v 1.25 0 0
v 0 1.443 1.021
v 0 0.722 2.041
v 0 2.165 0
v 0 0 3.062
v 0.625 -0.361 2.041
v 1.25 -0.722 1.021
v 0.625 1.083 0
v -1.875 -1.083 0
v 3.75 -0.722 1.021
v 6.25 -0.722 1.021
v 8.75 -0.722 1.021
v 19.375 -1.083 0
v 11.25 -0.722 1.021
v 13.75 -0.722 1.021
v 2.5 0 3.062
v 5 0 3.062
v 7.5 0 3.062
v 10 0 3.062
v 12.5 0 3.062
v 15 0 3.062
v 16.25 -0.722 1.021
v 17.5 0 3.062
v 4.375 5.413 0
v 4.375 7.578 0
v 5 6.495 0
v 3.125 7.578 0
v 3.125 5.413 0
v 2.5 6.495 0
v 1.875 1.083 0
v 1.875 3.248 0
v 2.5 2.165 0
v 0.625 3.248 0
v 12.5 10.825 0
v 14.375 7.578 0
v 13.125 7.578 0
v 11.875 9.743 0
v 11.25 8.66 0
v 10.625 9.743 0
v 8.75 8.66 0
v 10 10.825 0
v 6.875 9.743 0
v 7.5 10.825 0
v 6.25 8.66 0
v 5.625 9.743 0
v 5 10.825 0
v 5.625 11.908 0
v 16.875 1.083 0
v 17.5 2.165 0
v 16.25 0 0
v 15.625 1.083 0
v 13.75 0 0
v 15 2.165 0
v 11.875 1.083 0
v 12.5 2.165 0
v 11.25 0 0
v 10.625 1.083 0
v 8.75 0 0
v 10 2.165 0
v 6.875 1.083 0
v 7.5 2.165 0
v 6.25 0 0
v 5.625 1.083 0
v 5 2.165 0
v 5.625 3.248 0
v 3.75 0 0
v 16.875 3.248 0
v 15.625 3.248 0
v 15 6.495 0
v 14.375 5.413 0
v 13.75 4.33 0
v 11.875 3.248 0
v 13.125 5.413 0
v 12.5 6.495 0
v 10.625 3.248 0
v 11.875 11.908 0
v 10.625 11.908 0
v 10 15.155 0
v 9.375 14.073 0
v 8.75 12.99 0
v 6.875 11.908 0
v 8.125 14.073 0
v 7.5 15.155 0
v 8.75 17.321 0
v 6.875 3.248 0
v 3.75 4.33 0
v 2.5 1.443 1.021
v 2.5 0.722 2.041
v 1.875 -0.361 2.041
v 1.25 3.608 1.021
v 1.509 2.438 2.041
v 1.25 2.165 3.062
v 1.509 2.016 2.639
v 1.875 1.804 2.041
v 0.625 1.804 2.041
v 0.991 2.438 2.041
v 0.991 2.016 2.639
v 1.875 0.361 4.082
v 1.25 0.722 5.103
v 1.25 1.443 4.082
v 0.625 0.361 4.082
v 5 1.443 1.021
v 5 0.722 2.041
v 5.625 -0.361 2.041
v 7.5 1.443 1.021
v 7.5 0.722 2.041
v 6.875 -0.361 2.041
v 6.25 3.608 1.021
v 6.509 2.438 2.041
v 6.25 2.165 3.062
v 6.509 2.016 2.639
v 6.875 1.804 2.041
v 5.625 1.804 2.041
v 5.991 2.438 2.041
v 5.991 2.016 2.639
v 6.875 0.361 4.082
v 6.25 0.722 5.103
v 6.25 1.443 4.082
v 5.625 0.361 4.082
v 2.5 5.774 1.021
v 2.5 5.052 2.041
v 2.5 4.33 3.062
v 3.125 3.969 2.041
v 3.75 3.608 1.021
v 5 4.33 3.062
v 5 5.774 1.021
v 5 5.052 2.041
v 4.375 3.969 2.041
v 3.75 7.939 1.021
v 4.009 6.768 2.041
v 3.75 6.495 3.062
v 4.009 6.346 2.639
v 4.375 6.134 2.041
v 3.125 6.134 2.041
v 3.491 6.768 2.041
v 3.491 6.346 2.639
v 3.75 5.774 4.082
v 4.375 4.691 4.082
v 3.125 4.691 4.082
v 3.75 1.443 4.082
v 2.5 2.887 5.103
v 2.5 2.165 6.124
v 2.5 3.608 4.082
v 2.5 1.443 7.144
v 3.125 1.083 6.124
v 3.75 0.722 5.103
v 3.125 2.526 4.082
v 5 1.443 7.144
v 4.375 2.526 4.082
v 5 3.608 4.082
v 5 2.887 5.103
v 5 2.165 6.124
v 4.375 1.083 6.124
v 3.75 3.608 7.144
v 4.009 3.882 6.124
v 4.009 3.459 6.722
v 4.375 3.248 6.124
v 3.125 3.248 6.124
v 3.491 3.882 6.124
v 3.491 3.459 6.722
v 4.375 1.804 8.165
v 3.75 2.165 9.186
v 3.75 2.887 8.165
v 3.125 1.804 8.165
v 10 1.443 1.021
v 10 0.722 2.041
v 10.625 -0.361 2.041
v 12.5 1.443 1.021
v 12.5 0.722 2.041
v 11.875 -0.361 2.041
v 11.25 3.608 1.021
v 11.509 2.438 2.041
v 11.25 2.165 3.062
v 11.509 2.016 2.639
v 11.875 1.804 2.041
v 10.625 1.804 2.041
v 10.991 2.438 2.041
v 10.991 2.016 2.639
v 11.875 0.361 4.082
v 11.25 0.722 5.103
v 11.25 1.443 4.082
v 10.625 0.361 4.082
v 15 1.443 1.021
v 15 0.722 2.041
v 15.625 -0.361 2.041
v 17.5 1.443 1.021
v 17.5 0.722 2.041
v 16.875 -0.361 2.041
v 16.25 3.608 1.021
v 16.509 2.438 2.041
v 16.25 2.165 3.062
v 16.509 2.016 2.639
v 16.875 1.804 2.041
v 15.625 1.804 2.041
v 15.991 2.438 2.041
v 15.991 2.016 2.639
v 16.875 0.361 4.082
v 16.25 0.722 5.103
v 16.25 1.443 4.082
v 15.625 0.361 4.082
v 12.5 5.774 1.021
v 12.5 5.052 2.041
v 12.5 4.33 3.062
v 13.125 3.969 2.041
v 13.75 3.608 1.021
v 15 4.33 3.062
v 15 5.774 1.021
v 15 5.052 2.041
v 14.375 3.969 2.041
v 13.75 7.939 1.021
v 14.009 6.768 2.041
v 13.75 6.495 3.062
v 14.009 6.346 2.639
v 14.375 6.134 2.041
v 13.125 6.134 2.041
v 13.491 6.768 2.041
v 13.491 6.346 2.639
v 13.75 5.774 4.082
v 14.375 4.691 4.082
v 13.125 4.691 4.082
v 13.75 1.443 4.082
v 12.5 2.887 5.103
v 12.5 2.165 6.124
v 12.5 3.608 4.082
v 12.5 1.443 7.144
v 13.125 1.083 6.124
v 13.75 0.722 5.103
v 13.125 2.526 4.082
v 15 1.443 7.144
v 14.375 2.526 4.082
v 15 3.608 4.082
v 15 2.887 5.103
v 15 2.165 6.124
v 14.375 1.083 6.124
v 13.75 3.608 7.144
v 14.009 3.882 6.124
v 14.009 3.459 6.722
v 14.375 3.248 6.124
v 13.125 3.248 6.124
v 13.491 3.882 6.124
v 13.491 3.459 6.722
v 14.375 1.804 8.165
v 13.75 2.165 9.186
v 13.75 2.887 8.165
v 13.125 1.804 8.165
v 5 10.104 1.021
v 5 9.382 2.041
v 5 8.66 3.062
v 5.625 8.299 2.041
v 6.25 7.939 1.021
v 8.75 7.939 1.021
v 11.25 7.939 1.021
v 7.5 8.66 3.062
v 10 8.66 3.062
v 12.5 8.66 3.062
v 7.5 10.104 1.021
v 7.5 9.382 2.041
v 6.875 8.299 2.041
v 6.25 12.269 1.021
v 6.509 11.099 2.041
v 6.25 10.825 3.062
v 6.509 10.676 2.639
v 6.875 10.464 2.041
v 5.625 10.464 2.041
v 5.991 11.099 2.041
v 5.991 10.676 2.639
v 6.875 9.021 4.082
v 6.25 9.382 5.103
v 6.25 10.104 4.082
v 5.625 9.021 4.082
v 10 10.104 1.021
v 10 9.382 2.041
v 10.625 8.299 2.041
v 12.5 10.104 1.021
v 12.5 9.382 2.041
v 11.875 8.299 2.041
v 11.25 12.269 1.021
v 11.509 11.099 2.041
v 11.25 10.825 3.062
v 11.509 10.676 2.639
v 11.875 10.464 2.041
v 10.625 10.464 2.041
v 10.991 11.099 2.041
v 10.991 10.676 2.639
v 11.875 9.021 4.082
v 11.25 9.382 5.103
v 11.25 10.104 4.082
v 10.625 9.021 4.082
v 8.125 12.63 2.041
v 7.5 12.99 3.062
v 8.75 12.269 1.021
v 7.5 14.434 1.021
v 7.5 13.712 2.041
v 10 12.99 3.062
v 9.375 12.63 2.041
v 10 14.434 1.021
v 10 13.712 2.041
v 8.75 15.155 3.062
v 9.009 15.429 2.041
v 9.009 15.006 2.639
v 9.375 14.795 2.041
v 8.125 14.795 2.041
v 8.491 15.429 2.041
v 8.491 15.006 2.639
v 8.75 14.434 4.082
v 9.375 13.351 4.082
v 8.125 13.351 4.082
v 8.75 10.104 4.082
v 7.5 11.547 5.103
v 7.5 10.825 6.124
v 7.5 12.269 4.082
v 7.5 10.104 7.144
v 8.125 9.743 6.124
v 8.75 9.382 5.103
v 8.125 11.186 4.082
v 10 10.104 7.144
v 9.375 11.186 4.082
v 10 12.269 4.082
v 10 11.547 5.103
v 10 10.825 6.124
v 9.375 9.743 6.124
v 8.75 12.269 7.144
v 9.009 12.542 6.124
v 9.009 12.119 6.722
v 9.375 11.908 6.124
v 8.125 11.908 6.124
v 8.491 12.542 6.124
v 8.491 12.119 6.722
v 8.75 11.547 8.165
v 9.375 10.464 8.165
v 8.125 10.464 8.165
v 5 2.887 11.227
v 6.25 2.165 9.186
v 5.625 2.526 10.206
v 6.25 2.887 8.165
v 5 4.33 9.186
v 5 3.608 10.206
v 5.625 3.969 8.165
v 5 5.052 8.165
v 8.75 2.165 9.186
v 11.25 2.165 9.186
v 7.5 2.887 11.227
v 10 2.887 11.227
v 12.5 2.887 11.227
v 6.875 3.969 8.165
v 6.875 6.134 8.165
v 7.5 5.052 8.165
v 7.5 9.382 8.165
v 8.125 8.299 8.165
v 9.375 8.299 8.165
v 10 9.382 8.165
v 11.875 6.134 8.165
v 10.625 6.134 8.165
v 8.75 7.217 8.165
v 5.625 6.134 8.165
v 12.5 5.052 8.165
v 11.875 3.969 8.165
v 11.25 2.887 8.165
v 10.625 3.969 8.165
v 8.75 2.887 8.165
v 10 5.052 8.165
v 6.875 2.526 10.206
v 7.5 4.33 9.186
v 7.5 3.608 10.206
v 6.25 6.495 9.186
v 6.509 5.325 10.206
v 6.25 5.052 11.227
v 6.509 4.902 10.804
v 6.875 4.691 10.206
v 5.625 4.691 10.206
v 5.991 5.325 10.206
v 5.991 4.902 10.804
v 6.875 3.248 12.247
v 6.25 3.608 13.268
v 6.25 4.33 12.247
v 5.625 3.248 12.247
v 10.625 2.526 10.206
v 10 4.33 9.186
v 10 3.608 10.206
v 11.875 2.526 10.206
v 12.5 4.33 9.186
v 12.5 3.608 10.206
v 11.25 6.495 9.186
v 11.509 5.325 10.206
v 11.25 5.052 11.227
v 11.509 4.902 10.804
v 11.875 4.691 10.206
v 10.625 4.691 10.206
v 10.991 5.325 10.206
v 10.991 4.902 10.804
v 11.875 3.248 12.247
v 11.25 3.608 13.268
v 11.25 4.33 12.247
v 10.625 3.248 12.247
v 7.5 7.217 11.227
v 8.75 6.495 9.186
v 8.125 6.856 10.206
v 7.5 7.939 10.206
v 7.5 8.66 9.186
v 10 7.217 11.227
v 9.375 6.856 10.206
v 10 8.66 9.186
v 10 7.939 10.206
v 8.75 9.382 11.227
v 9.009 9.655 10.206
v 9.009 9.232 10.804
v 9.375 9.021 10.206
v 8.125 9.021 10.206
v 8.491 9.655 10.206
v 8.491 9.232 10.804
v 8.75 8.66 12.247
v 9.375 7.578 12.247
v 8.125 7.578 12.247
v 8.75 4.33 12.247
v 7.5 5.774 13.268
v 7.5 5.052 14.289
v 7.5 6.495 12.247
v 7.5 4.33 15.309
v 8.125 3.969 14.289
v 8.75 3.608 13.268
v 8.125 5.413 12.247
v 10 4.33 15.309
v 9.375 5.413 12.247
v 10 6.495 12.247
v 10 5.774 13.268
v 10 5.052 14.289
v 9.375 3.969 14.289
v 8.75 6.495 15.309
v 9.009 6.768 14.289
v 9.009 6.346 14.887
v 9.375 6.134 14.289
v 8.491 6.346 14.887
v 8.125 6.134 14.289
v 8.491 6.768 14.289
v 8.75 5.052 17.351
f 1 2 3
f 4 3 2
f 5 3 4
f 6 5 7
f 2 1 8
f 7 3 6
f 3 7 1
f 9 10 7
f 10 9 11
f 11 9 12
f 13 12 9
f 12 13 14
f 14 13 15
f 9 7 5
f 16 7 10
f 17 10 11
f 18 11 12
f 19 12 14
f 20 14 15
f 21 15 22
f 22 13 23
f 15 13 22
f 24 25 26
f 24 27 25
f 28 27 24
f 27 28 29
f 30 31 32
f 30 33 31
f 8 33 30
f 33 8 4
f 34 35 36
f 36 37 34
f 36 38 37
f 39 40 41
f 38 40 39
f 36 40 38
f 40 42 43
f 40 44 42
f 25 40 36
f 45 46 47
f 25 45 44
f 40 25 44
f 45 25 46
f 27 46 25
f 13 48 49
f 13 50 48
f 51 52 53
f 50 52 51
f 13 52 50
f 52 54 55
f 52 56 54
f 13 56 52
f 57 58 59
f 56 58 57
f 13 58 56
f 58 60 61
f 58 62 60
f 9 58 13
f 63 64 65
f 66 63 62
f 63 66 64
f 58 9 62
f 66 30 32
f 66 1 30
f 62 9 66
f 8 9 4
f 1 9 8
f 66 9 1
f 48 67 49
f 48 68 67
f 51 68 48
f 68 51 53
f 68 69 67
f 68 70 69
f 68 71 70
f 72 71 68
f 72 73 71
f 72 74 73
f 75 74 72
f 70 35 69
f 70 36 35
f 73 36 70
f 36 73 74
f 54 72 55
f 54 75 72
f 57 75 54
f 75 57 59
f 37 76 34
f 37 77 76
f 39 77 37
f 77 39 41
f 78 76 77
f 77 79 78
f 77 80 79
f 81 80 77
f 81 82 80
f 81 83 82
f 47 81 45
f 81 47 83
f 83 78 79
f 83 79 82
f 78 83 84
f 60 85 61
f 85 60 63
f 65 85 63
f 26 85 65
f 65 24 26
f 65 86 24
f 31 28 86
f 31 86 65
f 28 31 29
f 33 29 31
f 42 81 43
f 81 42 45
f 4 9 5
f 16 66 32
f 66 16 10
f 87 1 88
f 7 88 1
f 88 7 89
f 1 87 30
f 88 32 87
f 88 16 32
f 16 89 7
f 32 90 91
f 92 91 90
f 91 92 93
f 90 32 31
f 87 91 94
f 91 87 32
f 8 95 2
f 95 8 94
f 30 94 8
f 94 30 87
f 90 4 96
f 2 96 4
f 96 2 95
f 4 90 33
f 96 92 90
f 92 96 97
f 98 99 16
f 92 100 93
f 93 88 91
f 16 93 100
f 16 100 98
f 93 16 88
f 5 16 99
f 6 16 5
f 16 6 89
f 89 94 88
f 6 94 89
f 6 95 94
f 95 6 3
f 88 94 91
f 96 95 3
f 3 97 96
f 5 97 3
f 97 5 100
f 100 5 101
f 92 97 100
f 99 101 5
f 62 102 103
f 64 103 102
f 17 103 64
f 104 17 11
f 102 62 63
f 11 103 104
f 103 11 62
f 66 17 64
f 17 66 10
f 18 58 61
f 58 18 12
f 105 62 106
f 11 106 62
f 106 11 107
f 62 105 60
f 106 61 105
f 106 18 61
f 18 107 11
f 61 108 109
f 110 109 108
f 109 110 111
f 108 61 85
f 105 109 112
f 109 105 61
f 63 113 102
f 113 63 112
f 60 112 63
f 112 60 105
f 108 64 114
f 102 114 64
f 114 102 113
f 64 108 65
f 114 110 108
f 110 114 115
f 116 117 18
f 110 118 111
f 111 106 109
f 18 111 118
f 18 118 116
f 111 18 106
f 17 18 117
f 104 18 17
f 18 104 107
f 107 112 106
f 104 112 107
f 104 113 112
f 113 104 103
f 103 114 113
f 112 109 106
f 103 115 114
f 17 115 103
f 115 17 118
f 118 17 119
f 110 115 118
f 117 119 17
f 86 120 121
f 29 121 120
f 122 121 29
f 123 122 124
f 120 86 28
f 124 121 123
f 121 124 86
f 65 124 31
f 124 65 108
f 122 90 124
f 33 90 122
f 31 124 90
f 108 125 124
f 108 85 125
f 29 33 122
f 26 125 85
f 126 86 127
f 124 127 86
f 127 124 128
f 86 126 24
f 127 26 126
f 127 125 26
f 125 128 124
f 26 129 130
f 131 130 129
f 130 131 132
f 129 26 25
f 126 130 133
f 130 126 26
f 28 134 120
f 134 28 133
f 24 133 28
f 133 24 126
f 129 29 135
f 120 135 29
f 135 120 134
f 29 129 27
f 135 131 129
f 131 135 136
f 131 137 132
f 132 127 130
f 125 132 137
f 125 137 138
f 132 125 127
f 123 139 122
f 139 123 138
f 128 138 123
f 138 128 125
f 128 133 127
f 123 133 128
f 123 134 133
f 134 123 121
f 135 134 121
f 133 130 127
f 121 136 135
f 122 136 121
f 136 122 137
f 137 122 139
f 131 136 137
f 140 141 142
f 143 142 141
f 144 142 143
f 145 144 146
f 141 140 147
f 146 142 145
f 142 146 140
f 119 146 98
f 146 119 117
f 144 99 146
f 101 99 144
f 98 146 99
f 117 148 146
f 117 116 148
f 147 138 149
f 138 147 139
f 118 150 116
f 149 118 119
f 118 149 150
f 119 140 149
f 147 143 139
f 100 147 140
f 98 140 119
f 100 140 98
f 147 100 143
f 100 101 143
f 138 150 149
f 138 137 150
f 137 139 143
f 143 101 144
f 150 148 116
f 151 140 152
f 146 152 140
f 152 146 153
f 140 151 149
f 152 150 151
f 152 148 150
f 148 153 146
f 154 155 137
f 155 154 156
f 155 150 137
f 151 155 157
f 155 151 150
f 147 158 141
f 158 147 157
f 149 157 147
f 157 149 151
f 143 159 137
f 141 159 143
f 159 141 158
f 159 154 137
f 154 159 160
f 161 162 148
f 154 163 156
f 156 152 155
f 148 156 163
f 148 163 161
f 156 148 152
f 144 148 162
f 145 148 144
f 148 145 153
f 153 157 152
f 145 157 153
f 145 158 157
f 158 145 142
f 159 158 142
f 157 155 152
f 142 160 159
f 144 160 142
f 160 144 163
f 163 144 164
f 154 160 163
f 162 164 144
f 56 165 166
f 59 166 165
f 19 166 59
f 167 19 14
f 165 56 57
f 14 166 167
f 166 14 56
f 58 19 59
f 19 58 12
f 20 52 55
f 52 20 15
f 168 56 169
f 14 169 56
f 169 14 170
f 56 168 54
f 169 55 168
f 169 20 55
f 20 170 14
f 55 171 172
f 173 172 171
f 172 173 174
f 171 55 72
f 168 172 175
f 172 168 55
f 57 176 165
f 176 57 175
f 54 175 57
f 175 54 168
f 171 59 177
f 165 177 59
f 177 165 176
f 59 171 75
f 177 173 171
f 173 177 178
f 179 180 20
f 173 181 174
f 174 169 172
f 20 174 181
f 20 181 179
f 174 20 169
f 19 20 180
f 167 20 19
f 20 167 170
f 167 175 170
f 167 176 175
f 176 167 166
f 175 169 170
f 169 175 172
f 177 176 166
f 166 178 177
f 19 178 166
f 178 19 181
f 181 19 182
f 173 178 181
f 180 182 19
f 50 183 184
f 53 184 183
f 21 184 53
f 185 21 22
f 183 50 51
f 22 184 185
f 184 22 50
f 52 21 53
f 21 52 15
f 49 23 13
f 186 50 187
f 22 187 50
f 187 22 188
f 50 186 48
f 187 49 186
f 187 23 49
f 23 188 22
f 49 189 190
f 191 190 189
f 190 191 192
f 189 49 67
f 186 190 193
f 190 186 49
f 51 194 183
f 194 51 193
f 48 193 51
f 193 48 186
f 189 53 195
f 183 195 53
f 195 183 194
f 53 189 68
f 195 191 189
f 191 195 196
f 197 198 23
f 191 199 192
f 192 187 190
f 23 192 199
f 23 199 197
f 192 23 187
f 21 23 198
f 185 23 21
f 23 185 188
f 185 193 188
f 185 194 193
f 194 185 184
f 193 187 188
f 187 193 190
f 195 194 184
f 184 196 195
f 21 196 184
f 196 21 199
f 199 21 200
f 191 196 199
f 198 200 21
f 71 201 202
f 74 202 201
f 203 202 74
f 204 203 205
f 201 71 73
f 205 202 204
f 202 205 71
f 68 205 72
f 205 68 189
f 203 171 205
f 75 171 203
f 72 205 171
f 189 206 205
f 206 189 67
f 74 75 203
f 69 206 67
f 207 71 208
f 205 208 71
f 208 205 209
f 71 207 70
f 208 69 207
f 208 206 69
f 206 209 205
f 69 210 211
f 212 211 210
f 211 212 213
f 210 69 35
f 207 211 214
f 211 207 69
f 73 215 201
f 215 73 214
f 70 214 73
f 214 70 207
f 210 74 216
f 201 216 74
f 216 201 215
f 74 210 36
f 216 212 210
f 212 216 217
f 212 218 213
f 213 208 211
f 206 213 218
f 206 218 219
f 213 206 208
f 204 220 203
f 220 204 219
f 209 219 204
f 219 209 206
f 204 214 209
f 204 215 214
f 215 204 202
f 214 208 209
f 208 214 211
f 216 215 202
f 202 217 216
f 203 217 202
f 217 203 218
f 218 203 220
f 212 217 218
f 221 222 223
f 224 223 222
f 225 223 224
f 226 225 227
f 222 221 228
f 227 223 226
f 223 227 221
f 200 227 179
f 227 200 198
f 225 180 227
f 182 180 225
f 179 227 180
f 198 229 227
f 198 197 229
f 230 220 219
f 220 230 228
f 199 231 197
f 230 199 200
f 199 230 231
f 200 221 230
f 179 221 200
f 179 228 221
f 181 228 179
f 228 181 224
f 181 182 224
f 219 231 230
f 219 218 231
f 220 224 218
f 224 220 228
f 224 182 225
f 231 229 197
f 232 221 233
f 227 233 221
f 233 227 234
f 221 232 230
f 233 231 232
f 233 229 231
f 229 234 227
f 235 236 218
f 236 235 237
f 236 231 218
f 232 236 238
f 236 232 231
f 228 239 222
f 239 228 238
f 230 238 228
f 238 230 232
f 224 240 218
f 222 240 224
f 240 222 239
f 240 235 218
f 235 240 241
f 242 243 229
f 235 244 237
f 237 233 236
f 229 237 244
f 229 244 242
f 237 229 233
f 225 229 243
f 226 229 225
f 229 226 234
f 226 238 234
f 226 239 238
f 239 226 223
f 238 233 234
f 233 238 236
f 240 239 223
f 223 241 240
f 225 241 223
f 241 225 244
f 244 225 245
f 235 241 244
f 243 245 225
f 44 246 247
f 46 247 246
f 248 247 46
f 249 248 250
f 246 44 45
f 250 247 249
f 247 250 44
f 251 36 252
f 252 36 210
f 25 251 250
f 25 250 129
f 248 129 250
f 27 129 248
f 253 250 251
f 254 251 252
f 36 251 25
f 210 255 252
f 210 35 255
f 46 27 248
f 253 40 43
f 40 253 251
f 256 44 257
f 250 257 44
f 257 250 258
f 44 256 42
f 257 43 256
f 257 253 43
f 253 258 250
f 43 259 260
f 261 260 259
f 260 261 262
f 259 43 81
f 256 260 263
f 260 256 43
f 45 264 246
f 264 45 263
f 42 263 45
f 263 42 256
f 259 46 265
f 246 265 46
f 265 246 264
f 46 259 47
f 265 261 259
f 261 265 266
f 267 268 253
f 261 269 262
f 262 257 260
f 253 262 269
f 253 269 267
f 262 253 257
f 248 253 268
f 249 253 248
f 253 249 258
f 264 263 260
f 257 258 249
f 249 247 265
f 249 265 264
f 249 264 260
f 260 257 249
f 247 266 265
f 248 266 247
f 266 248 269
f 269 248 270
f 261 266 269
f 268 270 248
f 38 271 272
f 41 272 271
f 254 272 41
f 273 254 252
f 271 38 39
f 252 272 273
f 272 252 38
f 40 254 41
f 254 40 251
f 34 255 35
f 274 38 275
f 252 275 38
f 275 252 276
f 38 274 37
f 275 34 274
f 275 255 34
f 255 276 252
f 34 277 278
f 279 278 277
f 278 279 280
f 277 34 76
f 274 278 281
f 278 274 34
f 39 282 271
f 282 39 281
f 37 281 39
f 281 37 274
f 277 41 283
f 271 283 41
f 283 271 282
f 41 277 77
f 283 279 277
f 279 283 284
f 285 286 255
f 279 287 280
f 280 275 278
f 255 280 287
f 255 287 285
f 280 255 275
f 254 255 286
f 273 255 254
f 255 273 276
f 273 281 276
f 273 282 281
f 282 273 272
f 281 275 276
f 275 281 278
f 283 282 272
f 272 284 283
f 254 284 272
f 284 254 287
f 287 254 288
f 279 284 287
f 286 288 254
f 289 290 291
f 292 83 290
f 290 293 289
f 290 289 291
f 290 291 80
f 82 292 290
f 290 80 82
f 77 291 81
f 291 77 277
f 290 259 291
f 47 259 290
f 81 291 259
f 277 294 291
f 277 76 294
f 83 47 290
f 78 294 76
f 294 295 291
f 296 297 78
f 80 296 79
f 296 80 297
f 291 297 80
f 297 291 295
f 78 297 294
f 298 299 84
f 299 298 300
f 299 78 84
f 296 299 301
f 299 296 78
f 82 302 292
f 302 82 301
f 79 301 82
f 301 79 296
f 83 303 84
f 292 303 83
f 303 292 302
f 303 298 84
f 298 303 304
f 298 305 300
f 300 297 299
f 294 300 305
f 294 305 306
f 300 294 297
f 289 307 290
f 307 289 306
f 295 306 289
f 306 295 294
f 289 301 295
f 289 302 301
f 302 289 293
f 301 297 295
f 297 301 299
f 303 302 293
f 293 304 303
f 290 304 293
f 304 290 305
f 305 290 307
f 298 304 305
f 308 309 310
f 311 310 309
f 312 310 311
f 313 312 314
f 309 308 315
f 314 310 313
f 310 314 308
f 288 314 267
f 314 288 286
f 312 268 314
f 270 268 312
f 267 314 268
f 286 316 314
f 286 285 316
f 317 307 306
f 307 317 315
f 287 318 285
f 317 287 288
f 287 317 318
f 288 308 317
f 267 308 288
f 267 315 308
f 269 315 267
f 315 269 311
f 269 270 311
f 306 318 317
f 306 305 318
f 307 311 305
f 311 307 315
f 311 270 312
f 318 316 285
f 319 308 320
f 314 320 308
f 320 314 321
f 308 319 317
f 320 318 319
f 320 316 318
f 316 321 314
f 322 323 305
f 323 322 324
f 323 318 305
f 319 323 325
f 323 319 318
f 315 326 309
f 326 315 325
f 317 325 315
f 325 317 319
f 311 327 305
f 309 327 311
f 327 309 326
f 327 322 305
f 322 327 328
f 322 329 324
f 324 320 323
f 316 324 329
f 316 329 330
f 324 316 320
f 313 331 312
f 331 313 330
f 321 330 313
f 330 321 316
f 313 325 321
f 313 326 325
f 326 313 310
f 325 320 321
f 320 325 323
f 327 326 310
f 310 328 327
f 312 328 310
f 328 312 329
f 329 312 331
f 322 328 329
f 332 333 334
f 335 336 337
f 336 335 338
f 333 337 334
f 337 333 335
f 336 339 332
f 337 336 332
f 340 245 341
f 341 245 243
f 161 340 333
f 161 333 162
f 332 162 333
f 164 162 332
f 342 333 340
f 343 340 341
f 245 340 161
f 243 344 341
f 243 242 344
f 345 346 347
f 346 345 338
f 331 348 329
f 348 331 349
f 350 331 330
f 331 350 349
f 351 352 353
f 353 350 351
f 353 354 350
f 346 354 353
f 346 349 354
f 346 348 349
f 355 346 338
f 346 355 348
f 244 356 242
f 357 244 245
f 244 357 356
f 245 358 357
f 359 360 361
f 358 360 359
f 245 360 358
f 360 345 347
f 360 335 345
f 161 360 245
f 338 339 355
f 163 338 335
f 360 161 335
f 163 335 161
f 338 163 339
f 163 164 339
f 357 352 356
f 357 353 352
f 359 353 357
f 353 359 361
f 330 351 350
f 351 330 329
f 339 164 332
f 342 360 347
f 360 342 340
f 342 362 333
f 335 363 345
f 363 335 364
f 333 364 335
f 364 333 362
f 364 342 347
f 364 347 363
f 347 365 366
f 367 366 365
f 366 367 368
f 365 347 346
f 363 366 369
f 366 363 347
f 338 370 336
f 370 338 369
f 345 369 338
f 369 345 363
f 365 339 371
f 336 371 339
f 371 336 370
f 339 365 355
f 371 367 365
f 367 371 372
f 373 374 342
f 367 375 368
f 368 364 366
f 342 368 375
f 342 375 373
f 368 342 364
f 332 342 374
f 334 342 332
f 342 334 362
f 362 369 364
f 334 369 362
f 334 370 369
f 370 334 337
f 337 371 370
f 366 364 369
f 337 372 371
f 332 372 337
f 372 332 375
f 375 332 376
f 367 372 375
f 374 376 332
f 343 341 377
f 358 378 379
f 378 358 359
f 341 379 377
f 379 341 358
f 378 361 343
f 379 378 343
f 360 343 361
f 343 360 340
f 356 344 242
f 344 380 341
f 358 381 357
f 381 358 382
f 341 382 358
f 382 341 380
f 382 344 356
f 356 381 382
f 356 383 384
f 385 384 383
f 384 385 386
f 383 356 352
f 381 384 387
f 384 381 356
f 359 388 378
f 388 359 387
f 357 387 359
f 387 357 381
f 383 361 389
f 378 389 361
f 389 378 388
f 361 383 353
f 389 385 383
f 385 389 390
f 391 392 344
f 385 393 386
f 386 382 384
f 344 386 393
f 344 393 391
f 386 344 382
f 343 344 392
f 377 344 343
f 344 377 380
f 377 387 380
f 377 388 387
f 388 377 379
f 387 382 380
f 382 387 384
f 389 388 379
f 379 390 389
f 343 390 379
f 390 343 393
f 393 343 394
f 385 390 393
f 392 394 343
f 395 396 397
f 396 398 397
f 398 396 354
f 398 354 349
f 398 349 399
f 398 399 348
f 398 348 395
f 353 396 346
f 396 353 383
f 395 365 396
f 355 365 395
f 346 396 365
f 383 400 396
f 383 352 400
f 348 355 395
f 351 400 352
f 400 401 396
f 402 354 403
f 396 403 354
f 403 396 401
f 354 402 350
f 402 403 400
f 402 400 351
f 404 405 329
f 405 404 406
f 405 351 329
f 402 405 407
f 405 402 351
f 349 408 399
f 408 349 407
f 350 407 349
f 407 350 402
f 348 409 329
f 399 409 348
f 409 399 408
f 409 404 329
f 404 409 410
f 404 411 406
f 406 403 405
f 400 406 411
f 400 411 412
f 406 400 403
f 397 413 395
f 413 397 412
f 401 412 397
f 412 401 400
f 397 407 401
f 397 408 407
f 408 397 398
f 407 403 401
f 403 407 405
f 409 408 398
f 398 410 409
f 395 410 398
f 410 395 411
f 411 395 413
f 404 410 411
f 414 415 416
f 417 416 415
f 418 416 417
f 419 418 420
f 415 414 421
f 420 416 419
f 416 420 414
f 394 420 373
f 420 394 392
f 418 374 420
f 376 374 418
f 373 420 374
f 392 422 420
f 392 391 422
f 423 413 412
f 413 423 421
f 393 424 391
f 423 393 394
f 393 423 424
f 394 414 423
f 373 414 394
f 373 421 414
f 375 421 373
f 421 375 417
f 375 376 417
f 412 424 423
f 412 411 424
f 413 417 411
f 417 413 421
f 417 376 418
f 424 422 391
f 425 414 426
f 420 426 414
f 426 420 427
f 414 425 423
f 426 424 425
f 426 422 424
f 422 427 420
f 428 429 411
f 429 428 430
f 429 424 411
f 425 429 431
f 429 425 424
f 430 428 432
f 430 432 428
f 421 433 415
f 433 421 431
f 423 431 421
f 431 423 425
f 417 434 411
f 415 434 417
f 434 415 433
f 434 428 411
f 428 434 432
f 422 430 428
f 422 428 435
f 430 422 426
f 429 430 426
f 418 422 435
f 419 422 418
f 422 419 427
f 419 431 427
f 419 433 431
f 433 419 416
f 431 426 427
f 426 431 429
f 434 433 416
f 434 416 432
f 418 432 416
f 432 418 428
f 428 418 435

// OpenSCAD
/***************************************************
Sierpinski Tetrahedron Generator
By Adam Anderson 

Iteratively creates the Sierpinski Tetrix using any 
starting 3D shape.
***************************************************/

//What would you like the starting shape to be?
shape = "Tetrahedron"; //["Tetrahedron":Tetrahedron, "Sphere":Sphere, "Cube":Cube]

side_length = 10;

//Controls the size of seed shapes
overlap = 1.5; //[0.5:0.5:10]

iterations = 4; //[1:8]



/* Useful_length scales the input length depending on the number
* of iterations so that the final geometry will occupy roughly the same
* volume regardless of the number of iterations.
*/
useful_length = side_length / pow(2, iterations - 1);

if(shape == "Tetrahedron") {
    Sierpinski(side_length, iterations) {
        tetrahedron(useful_length);
    }
}
else if(shape == "Sphere") {
    Sierpinski(side_length, iterations) {
        sphere(useful_length);
    }
}
else if(shape == "Cube") {
    Sierpinski(side_length, iterations) {
        cube(useful_length);
    }
}

module iterate(side = 10) {
    children(0);
    translate([side, 0, 0]) children(0);
    translate([side / 2, side * sqrt(3) / 2, 0]) children(0);
    translate([side / 2, side * sqrt(3) / 6, side * sqrt(6) / 3 ]) children(0);  
}

module tetrahedron(size) {
    polyhedron( 
        points = [ 
            [0, size * (sqrt(3) - (1 / sqrt(3))), 0], 
            [size, size * (-1 / sqrt(3)), 0], 
            [-size, size * (-1 / sqrt(3)), 0],
            [0, 0, size * 2 * sqrt(2 / 3)]
        ], 
        faces = [
            [0, 1, 3],
            [2, 3, 1], 
            [2, 0, 3],
            [2, 1, 0]
        ]
    );
}

/*
* Uses input shape to create Sierpinski Tetrix by scaling
* and translating duplicates of the original shape.
* See the iterate module for specific translation amounts.
*/
module Sierpinski(side = 10, iterations = 5) {
    if(iterations > 0) {
        iterate(side) {
            Sierpinski(side / 2, iterations - 1) {
                children(0);
            }
        }
        scale(overlap) children(0);
    }
}
